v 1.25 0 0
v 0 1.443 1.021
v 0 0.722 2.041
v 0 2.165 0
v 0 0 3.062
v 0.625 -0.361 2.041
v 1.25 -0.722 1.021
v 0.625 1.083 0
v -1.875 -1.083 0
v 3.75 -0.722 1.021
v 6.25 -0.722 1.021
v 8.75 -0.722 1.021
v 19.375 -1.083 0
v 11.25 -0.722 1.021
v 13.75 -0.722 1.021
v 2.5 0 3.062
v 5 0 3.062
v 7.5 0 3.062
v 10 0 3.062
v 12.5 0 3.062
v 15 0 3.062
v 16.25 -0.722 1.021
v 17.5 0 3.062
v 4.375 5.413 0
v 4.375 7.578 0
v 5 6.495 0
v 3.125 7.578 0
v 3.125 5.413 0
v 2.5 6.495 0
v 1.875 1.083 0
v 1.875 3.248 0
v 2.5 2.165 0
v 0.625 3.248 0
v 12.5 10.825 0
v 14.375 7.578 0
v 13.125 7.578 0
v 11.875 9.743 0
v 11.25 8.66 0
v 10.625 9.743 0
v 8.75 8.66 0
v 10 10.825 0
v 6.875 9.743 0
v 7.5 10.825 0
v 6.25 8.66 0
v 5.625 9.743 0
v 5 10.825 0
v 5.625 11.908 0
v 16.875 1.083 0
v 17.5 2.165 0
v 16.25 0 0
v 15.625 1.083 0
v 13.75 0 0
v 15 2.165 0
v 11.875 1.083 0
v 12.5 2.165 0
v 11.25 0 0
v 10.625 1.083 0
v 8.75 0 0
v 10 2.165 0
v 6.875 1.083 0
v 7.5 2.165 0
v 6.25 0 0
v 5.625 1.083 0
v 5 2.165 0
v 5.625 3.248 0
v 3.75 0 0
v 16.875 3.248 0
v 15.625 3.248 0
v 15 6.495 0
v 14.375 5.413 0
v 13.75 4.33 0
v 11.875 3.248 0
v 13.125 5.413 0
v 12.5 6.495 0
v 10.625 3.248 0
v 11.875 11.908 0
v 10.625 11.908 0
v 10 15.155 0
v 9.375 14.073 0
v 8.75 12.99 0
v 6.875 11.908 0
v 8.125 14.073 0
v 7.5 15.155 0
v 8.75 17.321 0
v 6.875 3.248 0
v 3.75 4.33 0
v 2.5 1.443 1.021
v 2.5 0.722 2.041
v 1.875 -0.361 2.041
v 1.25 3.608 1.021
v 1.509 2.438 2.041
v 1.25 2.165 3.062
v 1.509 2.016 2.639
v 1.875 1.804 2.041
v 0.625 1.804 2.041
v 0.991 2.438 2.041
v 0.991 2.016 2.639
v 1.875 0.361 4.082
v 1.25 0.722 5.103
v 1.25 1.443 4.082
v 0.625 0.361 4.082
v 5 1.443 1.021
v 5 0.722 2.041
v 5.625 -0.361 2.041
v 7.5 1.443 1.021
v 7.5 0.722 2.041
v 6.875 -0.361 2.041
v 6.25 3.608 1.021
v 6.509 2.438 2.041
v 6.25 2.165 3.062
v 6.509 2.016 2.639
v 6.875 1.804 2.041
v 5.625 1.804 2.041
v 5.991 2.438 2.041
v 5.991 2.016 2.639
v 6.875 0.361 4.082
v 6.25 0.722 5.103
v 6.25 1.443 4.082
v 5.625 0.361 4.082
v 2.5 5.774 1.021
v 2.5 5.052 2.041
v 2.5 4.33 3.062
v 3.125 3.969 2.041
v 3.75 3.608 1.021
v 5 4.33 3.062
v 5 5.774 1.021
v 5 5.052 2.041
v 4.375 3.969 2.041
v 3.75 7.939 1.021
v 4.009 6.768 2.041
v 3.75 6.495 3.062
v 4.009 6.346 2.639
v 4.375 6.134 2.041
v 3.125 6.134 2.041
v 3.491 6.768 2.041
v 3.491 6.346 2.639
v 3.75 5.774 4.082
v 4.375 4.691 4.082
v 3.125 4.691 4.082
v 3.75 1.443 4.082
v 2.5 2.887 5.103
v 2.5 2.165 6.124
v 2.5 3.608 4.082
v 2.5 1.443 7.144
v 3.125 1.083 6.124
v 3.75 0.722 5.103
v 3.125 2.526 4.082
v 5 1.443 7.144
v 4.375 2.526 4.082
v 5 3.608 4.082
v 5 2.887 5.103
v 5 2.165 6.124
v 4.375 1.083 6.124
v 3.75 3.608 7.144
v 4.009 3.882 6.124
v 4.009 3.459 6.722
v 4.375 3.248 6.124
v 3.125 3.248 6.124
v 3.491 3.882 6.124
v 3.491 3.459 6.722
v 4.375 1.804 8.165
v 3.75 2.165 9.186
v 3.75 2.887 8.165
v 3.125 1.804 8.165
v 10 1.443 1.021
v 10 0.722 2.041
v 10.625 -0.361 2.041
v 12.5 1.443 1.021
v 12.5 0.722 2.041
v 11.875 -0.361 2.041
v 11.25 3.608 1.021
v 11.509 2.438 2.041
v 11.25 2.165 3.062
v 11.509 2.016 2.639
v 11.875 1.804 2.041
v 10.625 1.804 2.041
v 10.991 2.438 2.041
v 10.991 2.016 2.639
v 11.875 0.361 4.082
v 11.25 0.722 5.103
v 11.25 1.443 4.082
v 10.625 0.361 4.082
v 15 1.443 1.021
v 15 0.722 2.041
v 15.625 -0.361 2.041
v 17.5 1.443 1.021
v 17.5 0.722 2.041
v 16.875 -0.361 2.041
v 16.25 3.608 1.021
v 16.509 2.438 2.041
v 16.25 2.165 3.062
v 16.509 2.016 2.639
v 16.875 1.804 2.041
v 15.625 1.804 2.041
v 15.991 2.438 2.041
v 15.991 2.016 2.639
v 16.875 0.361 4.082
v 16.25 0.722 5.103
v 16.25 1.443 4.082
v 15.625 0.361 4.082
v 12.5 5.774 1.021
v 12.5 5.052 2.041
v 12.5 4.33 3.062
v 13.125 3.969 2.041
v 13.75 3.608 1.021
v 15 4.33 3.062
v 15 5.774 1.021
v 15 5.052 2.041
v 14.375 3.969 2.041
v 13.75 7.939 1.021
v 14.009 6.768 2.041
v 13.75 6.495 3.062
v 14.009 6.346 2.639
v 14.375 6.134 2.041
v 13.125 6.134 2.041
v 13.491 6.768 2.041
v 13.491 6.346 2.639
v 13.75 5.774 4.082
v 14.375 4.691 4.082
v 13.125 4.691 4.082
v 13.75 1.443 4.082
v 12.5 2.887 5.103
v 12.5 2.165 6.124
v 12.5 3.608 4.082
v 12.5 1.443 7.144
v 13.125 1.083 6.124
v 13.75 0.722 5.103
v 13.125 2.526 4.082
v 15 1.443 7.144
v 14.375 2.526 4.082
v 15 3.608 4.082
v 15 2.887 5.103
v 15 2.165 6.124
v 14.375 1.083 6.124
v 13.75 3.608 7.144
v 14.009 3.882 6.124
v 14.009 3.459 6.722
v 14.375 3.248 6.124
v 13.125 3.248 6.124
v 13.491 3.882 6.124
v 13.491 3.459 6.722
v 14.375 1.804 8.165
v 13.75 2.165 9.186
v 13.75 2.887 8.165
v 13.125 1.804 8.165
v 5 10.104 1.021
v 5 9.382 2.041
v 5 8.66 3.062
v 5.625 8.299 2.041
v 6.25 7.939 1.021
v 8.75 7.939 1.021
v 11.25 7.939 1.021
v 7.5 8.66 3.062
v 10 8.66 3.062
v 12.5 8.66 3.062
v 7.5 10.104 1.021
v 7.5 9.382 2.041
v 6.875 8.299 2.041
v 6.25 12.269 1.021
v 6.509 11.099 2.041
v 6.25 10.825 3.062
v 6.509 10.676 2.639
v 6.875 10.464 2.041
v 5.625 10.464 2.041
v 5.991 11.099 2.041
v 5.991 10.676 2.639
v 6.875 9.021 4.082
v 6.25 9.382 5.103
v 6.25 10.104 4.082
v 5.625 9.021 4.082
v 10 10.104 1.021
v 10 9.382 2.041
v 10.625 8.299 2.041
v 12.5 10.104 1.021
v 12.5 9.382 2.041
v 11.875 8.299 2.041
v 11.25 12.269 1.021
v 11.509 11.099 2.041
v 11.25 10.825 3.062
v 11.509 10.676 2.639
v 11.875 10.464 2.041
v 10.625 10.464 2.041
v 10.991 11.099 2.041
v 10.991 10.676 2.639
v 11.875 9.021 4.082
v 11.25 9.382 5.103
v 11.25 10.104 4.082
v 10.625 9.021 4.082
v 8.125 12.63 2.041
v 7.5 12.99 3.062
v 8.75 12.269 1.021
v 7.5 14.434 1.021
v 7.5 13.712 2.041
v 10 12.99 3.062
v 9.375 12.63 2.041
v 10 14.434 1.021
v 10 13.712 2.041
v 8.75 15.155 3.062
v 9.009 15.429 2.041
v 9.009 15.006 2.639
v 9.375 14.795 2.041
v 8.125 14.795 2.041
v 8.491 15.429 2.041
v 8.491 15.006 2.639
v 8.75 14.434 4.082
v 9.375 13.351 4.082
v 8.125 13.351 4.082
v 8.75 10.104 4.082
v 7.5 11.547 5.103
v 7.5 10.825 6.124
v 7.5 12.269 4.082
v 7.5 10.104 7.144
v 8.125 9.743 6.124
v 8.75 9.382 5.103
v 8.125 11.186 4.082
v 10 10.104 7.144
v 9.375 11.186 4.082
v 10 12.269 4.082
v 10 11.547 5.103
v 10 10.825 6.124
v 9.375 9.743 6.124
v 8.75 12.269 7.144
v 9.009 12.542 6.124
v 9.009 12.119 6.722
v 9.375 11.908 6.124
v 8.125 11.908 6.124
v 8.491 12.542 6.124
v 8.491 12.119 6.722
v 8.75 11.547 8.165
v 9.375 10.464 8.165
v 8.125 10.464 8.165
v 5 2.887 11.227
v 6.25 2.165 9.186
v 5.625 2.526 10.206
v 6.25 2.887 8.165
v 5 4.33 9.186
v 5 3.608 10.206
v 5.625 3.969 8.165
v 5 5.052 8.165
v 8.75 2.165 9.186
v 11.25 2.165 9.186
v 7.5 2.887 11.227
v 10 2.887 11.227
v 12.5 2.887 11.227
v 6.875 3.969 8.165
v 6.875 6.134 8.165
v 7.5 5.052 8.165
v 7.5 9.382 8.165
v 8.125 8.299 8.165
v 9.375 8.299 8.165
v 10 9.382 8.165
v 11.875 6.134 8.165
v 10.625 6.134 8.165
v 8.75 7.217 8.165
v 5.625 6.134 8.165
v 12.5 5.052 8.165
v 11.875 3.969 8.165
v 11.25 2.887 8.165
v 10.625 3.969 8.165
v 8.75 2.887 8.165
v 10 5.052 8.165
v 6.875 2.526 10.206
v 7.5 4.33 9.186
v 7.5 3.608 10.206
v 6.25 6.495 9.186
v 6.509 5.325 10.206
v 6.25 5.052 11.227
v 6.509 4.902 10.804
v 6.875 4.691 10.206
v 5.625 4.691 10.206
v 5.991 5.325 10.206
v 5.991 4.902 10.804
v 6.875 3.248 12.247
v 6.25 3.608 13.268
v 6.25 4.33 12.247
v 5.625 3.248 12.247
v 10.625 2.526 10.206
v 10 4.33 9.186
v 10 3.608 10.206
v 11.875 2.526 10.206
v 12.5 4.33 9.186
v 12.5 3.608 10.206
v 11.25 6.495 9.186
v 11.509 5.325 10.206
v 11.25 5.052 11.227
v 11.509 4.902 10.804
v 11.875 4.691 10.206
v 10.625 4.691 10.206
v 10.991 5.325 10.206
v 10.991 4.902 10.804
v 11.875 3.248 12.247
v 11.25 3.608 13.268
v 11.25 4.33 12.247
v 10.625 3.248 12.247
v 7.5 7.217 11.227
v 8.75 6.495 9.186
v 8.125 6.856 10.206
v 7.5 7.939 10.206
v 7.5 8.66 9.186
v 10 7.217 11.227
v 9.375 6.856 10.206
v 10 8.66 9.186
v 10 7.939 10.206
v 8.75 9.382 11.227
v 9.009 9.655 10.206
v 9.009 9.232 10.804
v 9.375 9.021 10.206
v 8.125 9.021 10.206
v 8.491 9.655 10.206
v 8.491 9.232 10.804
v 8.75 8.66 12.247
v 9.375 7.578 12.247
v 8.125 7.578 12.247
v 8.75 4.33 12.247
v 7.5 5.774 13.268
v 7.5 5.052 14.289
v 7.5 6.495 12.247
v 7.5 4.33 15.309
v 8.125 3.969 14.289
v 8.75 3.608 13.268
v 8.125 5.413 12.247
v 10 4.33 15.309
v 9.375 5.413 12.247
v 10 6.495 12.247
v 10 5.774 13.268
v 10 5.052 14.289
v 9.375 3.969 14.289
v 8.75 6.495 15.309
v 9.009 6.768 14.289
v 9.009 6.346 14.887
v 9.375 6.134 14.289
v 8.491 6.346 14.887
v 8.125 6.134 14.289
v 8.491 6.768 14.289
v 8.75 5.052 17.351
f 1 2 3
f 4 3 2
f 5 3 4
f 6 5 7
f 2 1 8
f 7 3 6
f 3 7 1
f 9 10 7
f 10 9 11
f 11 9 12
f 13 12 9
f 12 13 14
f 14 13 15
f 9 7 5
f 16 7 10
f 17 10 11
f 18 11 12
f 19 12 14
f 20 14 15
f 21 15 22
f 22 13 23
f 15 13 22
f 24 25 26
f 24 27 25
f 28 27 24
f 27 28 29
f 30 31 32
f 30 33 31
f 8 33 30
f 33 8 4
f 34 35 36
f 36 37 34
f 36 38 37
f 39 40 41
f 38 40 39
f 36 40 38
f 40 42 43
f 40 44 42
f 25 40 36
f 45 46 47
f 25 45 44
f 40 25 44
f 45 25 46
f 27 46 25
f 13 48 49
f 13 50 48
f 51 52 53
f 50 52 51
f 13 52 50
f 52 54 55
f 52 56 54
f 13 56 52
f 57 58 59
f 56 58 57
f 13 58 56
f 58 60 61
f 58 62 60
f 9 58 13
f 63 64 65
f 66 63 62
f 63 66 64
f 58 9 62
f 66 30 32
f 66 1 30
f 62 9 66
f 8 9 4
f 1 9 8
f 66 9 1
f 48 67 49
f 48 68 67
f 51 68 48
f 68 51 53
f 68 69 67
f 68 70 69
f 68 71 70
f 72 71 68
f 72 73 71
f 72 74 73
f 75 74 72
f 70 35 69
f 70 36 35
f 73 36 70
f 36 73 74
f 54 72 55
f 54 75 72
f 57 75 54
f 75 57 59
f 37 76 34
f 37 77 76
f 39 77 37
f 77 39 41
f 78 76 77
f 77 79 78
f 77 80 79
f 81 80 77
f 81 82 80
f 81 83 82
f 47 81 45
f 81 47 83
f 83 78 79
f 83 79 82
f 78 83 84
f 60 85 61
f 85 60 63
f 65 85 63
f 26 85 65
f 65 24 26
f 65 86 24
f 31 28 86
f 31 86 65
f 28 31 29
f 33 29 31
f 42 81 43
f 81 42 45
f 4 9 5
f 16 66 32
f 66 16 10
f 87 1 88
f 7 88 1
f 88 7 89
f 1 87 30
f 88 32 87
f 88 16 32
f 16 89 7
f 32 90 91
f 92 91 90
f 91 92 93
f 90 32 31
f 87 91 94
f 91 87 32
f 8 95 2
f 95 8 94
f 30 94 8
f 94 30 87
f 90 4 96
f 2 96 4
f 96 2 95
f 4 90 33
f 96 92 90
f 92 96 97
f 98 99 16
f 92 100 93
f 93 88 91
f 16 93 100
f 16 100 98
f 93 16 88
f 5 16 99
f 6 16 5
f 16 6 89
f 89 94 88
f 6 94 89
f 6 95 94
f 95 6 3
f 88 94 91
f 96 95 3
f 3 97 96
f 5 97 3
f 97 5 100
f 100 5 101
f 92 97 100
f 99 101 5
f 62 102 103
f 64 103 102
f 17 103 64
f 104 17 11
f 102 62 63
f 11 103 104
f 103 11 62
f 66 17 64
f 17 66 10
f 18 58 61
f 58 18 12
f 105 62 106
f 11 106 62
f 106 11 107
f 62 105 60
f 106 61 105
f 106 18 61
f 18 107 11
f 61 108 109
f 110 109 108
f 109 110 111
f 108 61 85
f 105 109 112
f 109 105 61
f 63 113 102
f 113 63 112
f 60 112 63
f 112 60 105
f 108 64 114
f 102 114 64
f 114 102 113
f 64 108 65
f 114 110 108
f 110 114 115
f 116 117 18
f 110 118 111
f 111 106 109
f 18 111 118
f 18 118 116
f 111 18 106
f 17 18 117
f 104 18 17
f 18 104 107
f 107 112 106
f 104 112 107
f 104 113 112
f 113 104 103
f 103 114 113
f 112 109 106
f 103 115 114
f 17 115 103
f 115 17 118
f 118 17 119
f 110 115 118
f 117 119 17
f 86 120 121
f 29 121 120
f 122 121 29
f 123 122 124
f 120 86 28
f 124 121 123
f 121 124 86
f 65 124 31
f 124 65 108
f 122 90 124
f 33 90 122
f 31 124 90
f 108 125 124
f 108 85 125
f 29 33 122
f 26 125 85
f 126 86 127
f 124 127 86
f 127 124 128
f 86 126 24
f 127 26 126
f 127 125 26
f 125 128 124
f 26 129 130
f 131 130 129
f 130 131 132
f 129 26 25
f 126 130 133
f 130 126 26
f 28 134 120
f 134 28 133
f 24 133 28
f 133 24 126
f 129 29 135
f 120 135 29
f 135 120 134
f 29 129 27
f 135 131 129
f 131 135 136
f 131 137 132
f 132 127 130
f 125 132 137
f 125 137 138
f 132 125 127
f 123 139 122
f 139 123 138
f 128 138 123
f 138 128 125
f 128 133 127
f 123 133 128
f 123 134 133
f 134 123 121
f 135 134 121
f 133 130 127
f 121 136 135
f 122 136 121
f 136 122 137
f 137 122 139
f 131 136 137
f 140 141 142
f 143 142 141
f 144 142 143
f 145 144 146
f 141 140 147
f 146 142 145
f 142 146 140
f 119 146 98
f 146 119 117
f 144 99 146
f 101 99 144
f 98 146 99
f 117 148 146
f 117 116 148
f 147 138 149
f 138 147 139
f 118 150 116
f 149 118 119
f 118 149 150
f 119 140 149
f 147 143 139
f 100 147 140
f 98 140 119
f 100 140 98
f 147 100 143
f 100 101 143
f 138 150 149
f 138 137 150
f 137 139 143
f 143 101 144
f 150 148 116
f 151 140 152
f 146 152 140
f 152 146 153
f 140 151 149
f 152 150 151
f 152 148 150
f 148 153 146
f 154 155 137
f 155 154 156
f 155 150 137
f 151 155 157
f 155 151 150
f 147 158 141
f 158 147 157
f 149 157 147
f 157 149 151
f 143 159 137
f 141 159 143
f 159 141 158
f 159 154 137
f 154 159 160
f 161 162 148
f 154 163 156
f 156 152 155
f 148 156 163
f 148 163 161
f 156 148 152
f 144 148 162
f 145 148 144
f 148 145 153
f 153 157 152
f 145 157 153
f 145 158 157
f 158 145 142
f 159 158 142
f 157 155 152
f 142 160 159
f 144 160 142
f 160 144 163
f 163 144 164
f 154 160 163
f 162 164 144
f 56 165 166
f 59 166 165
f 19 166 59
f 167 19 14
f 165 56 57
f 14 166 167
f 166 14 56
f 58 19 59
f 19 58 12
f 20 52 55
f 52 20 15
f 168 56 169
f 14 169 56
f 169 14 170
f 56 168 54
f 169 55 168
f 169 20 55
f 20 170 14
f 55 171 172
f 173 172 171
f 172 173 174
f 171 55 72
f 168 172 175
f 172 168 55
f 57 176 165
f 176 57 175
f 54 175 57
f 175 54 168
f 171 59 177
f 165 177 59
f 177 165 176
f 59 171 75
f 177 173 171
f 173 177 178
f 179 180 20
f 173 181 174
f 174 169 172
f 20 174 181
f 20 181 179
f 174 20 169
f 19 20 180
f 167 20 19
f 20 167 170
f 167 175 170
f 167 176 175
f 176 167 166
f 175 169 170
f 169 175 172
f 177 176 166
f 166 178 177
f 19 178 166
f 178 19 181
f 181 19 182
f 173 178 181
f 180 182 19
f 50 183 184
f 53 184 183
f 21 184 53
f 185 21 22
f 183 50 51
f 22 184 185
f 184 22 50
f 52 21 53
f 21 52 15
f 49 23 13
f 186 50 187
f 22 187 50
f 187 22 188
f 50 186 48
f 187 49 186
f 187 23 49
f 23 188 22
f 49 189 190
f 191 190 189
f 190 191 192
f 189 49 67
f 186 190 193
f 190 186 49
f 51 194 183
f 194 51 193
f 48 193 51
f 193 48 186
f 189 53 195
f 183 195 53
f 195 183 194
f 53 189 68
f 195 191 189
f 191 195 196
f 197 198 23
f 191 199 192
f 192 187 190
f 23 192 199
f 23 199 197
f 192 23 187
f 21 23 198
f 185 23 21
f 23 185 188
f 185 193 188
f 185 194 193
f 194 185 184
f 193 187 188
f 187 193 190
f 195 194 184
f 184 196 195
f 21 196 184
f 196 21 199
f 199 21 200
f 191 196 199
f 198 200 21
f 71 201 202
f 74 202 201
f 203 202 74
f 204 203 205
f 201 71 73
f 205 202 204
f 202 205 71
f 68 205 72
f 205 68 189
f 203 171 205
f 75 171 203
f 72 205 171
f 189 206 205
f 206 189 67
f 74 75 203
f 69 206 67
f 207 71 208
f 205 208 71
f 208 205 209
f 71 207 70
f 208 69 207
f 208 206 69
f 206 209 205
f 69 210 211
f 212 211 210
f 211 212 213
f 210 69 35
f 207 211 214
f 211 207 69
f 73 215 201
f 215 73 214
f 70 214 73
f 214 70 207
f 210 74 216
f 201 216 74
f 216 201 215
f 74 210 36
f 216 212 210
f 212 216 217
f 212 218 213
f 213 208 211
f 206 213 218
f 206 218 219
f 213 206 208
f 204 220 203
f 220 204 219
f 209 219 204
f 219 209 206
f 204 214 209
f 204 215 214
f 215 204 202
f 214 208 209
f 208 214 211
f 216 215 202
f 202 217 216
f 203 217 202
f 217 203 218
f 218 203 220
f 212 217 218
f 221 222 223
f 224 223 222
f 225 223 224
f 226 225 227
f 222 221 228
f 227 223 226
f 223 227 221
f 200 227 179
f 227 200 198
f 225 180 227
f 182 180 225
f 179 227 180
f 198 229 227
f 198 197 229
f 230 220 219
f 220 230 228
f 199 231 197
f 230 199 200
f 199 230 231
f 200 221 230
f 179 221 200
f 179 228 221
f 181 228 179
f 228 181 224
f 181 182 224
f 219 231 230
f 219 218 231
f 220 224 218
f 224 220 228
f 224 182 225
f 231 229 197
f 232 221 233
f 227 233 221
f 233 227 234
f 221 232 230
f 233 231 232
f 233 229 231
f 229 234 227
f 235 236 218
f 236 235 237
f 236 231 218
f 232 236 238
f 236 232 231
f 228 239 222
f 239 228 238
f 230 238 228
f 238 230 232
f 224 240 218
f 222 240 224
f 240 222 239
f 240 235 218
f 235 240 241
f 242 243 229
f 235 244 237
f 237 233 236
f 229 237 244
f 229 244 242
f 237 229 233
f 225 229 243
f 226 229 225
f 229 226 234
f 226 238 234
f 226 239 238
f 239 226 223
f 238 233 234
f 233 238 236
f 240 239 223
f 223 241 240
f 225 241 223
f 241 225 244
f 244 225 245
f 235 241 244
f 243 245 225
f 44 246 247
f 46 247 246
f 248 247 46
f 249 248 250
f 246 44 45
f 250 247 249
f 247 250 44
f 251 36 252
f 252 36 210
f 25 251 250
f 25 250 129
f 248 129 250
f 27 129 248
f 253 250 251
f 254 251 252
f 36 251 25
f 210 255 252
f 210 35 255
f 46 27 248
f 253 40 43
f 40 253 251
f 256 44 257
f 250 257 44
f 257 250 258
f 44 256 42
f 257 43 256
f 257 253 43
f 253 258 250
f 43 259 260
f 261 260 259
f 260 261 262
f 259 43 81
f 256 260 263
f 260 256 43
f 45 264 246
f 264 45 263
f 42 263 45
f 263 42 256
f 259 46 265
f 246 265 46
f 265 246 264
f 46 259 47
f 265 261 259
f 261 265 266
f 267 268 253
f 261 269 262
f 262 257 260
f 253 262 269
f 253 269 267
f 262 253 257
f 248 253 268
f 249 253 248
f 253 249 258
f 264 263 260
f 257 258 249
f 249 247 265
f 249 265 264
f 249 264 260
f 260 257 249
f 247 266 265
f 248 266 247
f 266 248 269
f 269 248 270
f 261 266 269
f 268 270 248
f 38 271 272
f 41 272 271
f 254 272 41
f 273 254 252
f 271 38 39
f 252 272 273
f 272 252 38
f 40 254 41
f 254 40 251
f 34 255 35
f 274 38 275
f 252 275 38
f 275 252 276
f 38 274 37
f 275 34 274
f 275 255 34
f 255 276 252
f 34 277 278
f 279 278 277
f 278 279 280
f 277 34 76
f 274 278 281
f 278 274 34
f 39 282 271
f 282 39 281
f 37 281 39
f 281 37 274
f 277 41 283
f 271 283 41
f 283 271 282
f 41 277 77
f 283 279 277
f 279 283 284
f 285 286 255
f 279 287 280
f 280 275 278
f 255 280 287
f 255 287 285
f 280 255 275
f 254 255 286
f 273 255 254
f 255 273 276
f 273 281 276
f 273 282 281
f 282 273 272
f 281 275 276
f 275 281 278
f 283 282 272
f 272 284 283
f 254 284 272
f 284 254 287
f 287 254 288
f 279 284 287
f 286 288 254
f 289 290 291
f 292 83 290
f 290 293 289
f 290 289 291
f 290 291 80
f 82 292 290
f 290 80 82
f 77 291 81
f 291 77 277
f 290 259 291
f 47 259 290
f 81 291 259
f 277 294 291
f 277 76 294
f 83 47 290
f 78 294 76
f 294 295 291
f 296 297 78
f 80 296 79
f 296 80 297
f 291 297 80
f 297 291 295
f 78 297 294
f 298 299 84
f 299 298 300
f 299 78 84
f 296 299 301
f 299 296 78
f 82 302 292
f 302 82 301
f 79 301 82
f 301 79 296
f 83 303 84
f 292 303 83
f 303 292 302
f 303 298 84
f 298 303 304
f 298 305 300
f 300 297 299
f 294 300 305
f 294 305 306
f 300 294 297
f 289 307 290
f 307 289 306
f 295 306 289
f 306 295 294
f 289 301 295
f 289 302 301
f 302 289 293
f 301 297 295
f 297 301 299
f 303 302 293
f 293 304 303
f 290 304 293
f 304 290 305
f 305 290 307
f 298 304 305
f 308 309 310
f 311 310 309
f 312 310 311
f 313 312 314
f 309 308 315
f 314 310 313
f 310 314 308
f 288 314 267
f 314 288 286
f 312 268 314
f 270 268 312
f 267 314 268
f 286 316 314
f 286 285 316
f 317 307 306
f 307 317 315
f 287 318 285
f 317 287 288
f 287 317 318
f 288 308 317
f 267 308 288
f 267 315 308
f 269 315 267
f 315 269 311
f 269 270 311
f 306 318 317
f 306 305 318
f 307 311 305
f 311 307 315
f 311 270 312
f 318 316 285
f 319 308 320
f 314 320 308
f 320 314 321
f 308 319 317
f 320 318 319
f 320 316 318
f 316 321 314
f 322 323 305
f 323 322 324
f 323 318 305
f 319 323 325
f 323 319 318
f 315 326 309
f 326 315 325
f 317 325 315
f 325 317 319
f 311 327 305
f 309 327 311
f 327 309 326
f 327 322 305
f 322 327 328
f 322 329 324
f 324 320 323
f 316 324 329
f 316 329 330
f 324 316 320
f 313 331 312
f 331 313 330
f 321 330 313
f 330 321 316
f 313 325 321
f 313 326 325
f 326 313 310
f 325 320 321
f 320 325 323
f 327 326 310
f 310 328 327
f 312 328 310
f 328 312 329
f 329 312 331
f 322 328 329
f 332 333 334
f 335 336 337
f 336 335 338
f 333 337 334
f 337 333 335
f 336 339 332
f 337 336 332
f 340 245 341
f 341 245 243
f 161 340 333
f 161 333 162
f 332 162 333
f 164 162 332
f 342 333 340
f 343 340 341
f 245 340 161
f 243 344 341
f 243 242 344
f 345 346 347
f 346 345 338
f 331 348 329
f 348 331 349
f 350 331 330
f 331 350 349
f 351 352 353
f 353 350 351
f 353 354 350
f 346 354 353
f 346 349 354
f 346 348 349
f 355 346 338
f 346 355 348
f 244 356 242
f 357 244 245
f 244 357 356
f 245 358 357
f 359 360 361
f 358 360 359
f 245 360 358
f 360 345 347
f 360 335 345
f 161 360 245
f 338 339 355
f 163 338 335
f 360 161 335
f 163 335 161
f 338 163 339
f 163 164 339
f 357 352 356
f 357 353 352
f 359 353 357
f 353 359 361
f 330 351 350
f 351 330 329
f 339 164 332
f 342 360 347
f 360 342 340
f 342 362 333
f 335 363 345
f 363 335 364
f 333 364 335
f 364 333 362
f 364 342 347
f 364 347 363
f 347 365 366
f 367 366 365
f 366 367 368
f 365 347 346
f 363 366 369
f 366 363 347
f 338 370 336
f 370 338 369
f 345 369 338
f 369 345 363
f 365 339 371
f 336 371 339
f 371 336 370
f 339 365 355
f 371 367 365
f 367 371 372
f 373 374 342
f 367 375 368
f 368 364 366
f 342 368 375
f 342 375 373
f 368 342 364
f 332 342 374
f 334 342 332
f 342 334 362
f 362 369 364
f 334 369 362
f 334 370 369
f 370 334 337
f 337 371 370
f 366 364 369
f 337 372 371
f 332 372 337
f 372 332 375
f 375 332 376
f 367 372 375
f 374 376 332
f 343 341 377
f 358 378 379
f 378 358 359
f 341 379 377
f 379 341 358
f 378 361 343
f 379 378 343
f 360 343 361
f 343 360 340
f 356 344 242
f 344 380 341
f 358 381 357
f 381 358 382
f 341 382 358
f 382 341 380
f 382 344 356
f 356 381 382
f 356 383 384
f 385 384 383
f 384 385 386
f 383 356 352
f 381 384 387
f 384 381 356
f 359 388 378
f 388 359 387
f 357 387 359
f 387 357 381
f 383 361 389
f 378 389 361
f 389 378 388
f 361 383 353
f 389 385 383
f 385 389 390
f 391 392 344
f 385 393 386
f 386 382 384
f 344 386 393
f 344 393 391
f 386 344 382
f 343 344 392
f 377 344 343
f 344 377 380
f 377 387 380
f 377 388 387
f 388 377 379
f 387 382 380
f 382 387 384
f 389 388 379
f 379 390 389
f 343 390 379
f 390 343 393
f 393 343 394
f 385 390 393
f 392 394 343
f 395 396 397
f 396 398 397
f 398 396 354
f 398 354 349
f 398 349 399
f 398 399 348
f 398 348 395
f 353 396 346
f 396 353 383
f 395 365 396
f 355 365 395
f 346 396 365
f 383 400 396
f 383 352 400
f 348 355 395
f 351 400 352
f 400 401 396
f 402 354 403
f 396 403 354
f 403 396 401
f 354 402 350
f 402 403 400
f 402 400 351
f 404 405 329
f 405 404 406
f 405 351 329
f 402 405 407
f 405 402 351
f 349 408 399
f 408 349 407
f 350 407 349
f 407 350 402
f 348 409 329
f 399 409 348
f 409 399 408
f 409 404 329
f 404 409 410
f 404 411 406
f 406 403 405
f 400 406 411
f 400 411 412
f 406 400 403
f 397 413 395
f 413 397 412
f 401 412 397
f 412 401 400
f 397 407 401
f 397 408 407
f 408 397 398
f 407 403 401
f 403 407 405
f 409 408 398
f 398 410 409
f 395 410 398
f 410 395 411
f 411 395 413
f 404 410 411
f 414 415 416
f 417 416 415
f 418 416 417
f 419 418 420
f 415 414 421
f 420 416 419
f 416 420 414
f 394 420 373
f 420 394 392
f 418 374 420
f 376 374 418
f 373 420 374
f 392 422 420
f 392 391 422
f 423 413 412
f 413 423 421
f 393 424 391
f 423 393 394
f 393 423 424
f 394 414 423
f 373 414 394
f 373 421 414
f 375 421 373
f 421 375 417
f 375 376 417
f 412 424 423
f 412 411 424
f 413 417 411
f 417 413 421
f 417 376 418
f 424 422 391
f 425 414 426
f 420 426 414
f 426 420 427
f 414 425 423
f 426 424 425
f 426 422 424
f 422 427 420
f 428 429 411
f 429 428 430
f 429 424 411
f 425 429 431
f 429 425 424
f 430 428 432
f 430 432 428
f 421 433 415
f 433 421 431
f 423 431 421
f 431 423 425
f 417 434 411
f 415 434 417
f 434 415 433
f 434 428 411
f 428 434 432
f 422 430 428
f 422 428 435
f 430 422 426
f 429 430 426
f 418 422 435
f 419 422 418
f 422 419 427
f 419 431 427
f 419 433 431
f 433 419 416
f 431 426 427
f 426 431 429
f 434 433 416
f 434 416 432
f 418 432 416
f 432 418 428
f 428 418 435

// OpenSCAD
/***************************************************
Sierpinski Tetrahedron Generator
By Adam Anderson 

Iteratively creates the Sierpinski Tetrix using any 
starting 3D shape.
***************************************************/

//What would you like the starting shape to be?
shape = "Tetrahedron"; //["Tetrahedron":Tetrahedron, "Sphere":Sphere, "Cube":Cube]

side_length = 10;

//Controls the size of seed shapes
overlap = 1.5; //[0.5:0.5:10]

iterations = 4; //[1:8]



/* Useful_length scales the input length depending on the number
* of iterations so that the final geometry will occupy roughly the same
* volume regardless of the number of iterations.
*/
useful_length = side_length / pow(2, iterations - 1);

if(shape == "Tetrahedron") {
    Sierpinski(side_length, iterations) {
        tetrahedron(useful_length);
    }
}
else if(shape == "Sphere") {
    Sierpinski(side_length, iterations) {
        sphere(useful_length);
    }
}
else if(shape == "Cube") {
    Sierpinski(side_length, iterations) {
        cube(useful_length);
    }
}

module iterate(side = 10) {
    children(0);
    translate([side, 0, 0]) children(0);
    translate([side / 2, side * sqrt(3) / 2, 0]) children(0);
    translate([side / 2, side * sqrt(3) / 6, side * sqrt(6) / 3 ]) children(0);  
}

module tetrahedron(size) {
    polyhedron( 
        points = [ 
            [0, size * (sqrt(3) - (1 / sqrt(3))), 0], 
            [size, size * (-1 / sqrt(3)), 0], 
            [-size, size * (-1 / sqrt(3)), 0],
            [0, 0, size * 2 * sqrt(2 / 3)]
        ], 
        faces = [
            [0, 1, 3],
            [2, 3, 1], 
            [2, 0, 3],
            [2, 1, 0]
        ]
    );
}

/*
* Uses input shape to create Sierpinski Tetrix by scaling
* and translating duplicates of the original shape.
* See the iterate module for specific translation amounts.
*/
module Sierpinski(side = 10, iterations = 5) {
    if(iterations > 0) {
        iterate(side) {
            Sierpinski(side / 2, iterations - 1) {
                children(0);
            }
        }
        scale(overlap) children(0);
    }
}
